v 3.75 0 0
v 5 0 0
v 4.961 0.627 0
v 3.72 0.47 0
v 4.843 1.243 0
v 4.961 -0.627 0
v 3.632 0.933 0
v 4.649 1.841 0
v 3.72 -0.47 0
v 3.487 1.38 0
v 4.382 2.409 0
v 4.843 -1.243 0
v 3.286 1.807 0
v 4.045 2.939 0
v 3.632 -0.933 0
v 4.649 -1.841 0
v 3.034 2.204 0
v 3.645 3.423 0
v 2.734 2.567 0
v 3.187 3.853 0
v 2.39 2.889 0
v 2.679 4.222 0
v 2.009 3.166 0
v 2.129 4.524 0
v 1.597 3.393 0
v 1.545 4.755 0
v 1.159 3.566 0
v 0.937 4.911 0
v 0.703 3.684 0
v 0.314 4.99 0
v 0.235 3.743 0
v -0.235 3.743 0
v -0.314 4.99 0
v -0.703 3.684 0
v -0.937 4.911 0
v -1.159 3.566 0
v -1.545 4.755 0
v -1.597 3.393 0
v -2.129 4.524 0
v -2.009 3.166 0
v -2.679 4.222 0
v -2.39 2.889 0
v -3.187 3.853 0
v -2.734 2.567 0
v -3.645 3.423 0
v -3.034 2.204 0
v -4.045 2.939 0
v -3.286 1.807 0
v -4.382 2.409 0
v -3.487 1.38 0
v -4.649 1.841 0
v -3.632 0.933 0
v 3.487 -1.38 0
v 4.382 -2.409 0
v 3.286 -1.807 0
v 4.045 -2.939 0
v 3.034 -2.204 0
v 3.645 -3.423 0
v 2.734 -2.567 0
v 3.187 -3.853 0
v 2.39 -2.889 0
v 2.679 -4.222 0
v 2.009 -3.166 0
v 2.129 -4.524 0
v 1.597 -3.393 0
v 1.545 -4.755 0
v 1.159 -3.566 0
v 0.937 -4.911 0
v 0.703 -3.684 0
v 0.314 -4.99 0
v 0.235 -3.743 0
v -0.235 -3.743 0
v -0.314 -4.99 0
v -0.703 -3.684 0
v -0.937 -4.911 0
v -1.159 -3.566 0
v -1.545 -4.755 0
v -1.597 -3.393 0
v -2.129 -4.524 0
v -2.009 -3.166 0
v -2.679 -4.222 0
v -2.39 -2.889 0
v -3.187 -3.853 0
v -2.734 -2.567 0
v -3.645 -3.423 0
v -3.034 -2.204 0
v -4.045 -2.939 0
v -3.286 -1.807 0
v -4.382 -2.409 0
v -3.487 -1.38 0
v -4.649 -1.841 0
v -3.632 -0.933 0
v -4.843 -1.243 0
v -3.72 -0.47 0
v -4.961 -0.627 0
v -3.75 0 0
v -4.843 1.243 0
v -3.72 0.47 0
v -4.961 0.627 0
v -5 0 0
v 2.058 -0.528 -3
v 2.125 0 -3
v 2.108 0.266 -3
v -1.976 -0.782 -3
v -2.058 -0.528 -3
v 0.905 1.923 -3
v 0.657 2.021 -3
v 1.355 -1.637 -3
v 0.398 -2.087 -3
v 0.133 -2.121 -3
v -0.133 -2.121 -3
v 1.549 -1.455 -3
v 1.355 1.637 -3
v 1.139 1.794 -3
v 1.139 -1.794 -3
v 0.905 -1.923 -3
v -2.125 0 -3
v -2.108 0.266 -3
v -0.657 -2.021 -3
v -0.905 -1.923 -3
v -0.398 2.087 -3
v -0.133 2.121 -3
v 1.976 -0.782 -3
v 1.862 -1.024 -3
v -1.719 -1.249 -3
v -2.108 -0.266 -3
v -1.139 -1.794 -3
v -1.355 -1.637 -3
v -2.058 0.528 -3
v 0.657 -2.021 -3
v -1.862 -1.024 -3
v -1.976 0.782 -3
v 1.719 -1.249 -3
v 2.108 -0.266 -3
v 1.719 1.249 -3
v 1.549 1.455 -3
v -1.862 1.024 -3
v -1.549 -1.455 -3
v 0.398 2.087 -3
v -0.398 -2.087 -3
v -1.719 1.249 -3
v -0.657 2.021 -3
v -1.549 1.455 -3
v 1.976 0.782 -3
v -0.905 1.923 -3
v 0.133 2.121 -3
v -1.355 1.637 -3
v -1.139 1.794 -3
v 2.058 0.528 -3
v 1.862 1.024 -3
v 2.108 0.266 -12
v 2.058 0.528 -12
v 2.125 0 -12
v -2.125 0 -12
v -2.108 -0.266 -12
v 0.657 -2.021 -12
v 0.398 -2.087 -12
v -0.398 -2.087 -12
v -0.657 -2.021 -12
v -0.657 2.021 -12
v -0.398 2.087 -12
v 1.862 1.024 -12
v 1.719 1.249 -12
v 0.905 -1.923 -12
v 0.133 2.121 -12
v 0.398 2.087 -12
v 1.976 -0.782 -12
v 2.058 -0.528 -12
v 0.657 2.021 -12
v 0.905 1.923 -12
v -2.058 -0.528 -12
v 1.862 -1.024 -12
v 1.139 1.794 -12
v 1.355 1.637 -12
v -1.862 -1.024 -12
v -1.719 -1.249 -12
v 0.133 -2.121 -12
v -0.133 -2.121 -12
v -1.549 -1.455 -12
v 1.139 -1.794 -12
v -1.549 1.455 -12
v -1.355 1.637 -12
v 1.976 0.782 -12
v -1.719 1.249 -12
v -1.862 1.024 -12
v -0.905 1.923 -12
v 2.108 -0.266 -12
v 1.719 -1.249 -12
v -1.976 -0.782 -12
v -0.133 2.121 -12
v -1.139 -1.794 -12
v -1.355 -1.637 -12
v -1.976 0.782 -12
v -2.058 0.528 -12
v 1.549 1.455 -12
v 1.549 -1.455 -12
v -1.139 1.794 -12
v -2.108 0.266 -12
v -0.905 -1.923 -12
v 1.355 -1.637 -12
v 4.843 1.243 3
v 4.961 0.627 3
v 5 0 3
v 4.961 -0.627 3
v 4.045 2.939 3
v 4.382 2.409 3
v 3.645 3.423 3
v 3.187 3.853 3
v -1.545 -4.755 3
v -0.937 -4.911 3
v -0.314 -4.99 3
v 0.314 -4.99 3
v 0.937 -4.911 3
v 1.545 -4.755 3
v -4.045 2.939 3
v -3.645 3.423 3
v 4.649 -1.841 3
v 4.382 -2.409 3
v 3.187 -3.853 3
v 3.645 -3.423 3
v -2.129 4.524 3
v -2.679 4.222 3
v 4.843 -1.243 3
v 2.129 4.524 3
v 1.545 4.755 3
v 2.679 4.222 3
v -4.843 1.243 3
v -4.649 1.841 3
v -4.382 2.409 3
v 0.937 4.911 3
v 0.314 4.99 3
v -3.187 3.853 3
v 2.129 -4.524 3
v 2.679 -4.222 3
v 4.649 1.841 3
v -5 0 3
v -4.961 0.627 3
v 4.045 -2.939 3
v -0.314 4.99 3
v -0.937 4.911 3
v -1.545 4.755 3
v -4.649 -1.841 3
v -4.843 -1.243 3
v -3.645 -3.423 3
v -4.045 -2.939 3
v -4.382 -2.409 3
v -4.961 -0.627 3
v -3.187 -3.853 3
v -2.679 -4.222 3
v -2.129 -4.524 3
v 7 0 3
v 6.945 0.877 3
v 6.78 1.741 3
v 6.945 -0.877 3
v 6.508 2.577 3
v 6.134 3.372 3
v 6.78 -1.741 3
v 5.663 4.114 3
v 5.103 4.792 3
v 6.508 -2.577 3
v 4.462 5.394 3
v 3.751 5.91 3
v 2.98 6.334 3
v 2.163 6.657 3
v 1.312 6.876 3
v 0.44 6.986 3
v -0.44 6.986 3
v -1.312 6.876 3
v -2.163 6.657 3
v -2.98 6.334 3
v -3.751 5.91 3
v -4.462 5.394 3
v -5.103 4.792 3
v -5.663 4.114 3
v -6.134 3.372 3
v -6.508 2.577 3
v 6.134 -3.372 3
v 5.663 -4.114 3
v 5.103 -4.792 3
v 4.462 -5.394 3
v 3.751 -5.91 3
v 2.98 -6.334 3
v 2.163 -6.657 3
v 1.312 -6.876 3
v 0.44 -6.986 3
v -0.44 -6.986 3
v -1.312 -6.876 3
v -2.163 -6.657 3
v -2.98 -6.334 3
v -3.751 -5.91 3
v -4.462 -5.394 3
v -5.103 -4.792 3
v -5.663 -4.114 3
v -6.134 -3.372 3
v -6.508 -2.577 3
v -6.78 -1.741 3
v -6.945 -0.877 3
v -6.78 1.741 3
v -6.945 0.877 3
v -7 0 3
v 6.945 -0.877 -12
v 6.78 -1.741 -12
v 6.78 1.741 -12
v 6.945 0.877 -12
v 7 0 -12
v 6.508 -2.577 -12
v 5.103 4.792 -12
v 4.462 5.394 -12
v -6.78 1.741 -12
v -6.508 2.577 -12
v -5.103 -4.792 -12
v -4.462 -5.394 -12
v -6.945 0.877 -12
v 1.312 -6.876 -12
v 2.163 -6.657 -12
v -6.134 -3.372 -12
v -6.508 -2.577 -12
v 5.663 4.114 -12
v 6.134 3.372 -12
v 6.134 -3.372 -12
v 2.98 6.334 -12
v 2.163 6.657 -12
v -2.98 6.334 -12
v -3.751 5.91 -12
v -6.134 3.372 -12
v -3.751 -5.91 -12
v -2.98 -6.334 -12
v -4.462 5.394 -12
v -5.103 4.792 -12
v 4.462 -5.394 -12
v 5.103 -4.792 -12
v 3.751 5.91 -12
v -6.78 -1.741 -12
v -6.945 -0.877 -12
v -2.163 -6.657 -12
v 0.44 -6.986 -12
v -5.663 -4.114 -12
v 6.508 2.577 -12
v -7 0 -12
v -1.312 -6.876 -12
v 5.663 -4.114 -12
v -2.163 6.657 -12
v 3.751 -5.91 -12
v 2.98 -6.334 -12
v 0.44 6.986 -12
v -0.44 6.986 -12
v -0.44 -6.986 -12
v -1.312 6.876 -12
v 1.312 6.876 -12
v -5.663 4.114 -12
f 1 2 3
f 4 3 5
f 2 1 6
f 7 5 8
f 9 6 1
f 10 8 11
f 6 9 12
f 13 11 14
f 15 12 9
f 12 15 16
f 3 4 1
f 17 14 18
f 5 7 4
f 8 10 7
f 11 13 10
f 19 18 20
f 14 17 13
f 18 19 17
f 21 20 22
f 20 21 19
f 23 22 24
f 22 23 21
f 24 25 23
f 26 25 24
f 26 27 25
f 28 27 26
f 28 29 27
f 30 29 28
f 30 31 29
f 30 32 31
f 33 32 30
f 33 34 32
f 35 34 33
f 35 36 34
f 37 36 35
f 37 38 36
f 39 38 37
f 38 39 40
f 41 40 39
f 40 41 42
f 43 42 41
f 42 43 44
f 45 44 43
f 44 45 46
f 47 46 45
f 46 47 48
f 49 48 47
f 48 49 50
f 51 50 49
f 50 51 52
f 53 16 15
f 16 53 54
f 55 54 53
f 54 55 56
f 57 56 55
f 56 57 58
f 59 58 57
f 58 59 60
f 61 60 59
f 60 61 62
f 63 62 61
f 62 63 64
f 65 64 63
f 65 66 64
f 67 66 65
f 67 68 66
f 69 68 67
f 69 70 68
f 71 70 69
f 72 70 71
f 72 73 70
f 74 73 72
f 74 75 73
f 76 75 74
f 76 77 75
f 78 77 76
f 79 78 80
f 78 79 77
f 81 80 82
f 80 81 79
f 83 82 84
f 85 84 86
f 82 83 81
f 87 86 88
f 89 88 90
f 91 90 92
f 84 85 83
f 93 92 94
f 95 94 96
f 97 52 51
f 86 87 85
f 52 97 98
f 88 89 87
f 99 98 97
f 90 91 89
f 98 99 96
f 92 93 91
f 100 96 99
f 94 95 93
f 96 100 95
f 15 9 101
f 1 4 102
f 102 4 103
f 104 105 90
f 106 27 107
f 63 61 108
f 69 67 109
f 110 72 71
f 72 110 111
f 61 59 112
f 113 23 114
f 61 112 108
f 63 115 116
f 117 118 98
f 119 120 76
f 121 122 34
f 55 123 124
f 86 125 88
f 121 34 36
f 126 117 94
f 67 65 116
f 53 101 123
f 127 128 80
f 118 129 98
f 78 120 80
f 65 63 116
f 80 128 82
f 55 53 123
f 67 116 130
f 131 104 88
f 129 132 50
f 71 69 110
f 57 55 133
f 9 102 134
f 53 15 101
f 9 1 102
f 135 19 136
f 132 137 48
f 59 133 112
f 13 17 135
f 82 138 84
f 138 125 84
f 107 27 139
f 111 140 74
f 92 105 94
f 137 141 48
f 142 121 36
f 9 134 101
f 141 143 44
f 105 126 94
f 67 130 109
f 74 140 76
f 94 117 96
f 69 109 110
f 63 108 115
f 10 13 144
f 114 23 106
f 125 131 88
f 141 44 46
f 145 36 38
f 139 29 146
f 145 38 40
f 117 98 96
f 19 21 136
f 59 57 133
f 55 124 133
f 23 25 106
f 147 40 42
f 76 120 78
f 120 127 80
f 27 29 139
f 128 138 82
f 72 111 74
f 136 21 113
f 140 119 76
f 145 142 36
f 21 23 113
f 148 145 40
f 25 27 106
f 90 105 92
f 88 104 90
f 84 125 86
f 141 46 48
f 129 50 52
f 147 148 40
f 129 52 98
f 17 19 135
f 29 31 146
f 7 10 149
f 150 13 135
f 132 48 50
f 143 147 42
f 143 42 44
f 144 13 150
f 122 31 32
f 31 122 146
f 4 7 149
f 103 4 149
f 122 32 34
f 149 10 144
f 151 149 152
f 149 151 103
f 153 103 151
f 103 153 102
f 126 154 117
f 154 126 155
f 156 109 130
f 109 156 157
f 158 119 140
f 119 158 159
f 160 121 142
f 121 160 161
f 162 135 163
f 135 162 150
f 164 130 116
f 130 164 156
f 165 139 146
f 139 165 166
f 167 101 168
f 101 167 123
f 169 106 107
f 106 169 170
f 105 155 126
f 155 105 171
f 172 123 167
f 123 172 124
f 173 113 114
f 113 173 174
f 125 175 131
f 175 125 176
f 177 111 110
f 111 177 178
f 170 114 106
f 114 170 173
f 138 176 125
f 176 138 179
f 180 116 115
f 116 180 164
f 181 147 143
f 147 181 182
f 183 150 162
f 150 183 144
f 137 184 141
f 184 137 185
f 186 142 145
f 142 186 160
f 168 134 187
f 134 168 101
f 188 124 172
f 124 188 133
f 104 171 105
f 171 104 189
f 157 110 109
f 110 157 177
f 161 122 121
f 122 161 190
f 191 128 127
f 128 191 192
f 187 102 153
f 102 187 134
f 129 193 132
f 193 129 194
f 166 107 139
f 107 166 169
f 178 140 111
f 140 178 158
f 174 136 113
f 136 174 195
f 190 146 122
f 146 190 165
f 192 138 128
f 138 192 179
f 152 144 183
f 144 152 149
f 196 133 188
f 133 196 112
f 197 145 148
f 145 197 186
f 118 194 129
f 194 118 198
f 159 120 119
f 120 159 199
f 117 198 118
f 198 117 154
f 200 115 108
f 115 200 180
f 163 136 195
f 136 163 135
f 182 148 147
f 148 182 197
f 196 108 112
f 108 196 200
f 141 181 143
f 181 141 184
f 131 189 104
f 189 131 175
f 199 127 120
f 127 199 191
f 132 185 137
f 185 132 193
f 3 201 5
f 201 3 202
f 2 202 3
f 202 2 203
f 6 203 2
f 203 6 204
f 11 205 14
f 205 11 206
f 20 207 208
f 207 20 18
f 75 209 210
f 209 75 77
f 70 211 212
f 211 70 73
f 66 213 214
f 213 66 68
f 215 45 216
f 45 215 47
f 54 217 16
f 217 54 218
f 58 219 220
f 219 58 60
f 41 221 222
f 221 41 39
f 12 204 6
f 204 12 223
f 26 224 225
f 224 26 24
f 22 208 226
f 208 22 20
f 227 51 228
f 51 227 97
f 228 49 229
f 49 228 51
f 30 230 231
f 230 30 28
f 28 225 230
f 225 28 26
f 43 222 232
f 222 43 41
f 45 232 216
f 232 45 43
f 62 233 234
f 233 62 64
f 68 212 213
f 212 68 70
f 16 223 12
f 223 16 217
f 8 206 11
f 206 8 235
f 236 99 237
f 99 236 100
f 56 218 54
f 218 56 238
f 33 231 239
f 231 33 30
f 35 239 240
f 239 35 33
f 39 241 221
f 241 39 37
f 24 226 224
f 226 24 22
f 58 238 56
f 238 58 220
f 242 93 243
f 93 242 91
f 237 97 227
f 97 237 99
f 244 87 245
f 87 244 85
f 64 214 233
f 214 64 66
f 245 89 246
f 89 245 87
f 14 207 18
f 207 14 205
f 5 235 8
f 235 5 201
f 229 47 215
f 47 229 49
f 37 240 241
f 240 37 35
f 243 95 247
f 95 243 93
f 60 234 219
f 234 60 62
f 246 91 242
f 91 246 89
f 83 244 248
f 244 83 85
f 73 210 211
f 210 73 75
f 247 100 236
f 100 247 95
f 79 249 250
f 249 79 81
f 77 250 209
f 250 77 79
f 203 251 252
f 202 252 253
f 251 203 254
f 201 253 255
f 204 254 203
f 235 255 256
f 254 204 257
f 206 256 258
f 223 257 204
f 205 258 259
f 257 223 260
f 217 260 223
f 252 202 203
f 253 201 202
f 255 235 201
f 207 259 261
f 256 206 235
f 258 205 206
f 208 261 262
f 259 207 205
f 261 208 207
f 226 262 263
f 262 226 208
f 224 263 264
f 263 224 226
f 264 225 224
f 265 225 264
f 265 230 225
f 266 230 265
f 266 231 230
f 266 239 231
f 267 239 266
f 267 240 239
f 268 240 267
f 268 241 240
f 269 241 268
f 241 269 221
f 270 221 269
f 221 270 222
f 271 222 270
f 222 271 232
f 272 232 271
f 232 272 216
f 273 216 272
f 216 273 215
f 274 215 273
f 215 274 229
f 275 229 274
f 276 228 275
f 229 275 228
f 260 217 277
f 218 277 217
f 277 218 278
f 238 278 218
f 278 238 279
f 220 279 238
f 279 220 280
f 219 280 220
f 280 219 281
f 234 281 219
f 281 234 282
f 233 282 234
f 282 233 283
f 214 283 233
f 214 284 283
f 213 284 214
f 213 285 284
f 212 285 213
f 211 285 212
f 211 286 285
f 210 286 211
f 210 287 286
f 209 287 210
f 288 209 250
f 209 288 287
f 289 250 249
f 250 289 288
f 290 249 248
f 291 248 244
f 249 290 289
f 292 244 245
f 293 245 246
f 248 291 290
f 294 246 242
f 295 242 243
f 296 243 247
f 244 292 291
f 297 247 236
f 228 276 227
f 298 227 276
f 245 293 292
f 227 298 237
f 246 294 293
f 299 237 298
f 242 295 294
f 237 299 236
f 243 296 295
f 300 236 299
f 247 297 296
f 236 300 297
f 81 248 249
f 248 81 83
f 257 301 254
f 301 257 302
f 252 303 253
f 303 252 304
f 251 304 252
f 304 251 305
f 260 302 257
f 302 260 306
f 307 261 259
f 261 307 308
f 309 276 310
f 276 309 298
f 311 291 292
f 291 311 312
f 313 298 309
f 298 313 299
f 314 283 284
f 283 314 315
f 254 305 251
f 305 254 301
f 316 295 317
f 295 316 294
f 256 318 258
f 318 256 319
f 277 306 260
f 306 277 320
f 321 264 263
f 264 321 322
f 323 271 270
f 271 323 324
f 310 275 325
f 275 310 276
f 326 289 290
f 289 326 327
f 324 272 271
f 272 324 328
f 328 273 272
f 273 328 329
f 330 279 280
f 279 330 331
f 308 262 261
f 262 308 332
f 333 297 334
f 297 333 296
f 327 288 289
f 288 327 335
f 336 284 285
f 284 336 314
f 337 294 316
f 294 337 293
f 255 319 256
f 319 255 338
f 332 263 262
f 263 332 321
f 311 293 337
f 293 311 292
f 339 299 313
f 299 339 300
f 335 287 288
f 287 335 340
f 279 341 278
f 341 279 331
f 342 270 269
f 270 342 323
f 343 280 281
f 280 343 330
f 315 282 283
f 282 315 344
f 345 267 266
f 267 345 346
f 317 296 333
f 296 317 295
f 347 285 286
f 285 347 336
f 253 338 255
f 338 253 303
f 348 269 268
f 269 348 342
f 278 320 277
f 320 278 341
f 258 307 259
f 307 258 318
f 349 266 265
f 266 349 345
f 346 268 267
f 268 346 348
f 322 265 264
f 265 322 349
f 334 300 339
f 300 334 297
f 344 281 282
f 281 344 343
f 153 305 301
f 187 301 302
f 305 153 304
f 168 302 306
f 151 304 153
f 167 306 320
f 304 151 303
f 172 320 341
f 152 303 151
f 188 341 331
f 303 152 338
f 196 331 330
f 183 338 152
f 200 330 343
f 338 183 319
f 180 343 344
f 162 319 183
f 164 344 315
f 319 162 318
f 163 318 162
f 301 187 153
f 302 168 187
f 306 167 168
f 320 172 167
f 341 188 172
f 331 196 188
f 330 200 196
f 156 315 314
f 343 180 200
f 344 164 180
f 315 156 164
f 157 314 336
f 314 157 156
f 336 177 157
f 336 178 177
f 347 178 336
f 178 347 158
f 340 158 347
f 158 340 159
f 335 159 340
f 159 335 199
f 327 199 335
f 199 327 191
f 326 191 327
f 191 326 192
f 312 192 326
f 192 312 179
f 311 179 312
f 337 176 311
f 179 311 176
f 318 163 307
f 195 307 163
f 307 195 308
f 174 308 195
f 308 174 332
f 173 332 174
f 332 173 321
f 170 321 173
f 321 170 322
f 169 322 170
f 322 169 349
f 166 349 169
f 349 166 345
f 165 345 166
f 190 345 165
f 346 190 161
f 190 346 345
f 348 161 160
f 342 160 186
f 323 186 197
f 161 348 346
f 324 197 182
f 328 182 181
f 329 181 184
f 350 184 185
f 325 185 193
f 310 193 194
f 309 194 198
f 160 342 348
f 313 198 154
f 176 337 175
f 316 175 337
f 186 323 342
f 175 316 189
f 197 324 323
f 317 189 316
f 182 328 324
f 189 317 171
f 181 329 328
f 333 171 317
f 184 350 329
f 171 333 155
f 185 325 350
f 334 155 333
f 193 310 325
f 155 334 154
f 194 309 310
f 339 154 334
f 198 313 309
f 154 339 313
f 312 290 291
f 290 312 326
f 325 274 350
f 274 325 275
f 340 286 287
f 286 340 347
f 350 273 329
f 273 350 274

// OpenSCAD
$fn = 50;


difference() {
	union() {
		translate(v = [0, 0, -12.0000000000]) {
			cylinder(h = 15, r = 7.0000000000);
		}
	}
	union() {
		translate(v = [0, 0, 0]) {
			rotate(a = [0, 0, 0]) {
				difference() {
					union() {
						translate(v = [0, 0, -15.0000000000]) {
							cylinder(h = 15, r = 2.0000000000);
						}
						translate(v = [0, 0, -3]) {
							cylinder(h = 3, r1 = 2.1250000000, r2 = 3.7500000000);
						}
						translate(v = [0, 0, -15.0000000000]) {
							cylinder(h = 15, r = 2.1250000000);
						}
						translate(v = [0, 0, -15.0000000000]) {
							cylinder(h = 15, r = 2.0000000000);
						}
					}
					union();
				}
			}
		}
		#cylinder(h = 3, r = 5.0000000000);
	}
}
